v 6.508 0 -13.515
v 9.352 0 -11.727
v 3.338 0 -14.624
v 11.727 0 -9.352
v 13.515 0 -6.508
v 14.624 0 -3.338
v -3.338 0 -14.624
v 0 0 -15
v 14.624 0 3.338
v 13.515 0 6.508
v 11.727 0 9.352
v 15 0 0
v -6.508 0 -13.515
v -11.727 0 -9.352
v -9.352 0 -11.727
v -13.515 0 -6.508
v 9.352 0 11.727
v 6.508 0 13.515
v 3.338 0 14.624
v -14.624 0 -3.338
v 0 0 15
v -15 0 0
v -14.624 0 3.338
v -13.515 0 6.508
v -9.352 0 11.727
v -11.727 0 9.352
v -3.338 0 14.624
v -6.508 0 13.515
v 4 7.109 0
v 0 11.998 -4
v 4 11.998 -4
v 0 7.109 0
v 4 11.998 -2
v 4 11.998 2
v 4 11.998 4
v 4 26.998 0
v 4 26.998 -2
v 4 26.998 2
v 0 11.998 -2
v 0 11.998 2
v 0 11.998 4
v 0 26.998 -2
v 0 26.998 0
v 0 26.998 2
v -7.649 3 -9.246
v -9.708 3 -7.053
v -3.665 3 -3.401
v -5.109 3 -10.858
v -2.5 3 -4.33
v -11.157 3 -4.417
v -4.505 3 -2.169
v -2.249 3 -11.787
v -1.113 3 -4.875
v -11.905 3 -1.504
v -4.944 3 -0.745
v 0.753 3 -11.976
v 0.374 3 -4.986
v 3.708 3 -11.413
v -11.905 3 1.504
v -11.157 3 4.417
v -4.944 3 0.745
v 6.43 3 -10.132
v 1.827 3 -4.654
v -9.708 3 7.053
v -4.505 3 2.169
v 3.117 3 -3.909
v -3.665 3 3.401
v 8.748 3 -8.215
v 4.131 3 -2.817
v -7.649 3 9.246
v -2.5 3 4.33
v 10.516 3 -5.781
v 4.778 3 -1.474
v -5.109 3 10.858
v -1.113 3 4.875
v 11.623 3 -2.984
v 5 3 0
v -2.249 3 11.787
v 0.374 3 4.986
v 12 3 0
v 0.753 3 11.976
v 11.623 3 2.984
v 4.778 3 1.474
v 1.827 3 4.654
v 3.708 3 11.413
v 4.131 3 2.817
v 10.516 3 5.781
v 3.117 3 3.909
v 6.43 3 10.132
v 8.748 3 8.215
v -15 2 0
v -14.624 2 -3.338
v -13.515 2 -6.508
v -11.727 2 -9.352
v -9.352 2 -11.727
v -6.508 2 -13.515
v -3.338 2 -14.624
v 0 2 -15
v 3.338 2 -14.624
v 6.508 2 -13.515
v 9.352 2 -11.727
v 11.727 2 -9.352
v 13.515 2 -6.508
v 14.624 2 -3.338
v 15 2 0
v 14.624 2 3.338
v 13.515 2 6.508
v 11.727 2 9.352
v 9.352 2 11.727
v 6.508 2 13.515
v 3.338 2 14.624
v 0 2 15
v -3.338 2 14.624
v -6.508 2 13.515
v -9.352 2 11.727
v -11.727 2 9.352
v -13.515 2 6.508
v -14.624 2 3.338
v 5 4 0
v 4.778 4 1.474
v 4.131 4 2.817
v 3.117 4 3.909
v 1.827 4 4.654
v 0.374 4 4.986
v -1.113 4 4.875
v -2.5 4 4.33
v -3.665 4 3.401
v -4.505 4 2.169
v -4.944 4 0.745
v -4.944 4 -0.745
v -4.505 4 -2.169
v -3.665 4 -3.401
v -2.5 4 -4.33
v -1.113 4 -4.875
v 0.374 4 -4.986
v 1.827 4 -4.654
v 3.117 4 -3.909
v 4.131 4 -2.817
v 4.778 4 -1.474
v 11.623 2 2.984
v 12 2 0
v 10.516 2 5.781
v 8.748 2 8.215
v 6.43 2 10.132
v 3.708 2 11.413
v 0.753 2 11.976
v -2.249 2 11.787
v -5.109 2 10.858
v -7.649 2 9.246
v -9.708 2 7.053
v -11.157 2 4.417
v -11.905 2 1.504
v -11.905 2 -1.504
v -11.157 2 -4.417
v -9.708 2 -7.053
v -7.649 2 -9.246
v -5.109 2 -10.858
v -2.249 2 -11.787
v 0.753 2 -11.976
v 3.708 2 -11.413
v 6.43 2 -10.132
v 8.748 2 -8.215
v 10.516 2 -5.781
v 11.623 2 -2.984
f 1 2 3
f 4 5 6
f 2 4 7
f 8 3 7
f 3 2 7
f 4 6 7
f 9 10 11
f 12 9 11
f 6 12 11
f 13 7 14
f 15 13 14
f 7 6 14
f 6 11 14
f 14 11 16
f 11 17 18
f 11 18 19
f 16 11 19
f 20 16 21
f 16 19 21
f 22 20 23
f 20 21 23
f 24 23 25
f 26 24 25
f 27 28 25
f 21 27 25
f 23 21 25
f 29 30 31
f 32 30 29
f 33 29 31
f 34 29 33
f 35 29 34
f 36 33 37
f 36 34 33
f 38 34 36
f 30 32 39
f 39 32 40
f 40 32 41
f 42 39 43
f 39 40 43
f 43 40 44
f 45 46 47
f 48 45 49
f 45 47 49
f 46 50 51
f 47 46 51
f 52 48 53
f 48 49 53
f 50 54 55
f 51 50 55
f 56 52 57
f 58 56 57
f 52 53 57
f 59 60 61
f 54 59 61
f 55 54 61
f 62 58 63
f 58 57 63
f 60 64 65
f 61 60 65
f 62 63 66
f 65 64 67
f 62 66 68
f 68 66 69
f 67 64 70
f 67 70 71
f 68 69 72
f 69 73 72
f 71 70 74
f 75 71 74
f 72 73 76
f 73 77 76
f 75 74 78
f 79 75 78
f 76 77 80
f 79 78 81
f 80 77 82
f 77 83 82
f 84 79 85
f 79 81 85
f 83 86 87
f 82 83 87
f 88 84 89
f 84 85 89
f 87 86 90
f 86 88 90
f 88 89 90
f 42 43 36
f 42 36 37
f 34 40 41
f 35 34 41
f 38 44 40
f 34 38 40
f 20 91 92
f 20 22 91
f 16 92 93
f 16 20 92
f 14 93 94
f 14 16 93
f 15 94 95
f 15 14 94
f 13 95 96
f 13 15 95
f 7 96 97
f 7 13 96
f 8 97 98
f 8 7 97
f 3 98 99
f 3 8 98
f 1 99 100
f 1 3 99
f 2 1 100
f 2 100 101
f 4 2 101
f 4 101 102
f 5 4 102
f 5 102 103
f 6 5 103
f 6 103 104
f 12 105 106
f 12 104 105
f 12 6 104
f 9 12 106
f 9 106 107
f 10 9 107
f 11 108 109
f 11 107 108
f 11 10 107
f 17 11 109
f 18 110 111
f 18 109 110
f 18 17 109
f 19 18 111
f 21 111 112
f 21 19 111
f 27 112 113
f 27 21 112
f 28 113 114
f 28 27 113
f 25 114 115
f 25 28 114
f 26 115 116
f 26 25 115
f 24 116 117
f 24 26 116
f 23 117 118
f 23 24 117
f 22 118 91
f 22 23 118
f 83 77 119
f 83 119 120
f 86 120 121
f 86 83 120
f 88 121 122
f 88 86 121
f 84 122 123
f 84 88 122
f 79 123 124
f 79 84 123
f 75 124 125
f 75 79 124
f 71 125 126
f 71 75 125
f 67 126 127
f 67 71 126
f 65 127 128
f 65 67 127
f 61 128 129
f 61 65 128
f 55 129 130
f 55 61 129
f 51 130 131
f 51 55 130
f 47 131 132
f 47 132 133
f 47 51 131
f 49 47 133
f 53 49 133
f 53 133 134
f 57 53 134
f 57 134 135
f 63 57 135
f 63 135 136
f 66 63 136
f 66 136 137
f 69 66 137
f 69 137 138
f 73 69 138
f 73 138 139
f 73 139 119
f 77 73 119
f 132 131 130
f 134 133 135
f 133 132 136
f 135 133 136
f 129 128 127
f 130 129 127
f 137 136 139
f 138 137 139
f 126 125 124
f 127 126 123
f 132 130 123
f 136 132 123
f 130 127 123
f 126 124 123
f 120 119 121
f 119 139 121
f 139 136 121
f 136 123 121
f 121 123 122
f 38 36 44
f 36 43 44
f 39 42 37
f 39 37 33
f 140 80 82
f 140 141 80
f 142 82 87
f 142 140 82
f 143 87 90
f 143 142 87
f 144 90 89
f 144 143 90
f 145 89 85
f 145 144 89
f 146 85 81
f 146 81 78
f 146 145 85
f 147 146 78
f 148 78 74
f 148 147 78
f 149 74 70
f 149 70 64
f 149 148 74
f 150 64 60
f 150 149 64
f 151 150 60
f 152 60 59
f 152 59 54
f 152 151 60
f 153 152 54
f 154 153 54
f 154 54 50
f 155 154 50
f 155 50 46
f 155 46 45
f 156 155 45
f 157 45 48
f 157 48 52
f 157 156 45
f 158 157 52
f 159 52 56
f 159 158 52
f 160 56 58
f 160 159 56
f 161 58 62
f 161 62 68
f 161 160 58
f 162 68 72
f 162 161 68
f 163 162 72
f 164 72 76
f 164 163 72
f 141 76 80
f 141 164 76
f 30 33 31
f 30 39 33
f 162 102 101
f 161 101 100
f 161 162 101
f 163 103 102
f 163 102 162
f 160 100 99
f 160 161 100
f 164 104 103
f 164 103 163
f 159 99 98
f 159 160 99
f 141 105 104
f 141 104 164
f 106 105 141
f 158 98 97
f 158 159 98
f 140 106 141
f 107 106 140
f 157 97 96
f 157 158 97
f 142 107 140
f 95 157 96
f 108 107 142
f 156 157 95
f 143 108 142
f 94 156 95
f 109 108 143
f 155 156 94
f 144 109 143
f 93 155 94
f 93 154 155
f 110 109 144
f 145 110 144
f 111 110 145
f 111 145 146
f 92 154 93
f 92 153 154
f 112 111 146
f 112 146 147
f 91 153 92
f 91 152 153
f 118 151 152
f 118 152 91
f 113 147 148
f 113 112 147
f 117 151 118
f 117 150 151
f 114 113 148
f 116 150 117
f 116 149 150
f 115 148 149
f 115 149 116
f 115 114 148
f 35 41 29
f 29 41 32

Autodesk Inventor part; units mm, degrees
ref_plane "XZ Plane" through (0, 0, 0) normal (0, 1, 0) x (-1, 0, 0)
ref_plane "XY Plane" through (0, 0, 0) normal (0, 0, 1) x (1, 0, 0)
sketch "Sketch1" plane through (0, 0, 0) normal (0, 1, 0) x (-1, 0, 0)
  circle A0 centre (0, 0) radius 15
  circle A1 centre (0, 0) radius 12
  dimension "d0" = 30
  dimension "d2" = 24
extrude "Extrusion1" add sketch "Sketch1" along normal blind 2
sketch "Sketch2" plane through (0, 0, 0) normal (0, -1, 0) x (1, 0, 0)
  circle A0 centre (0, 0) radius 12 projected
  circle A1 centre (0, 0) radius 15 projected
  circle A2 centre (0, 0) radius 5
  dimension "d5" = 10
extrude "Extrusion2" add sketch "Sketch2" against normal blind 3 contours A0
sketch "Sketch3" plane through (0, 0, 0) normal (0, -1, 0) x (1, 0, 0)
  circle A0 centre (0, 0) radius 5 projected
extrude "Extrusion3" add sketch "Sketch3" against normal blind 4
ref_plane "Work Plane1" through (0, 0, 0) normal (1, 0, 0) x (0, 1, 0)
sketch "Sketch4" plane through (0, 0, 0) normal (1, 0, 0) x (0, 1, 0)
  line L0 (26.9981, 0) -> (26.9981, -2)
  line L1 (26.9981, -2) -> (11.9981, -2)
  line L2 (11.9981, -2) -> (11.9981, -4)
  line L3 (11.9981, -4) -> (7.1092, 0)
  line L4 (28.7393, 0) -> (4.7365, 0) construction
  line L5 (26.9981, 0) -> (26.9981, 2)
  line L6 (26.9981, 2) -> (11.9981, 2)
  line L7 (11.9981, 2) -> (11.9981, 4)
  line L8 (11.9981, 4) -> (7.1092, 0)
  point P0 (0, 0)
  dimension "d12" = 15
  dimension "d13" = 2
extrude "Extrusion4" add sketch "Sketch4" along normal blind 4
properties part number "target"
